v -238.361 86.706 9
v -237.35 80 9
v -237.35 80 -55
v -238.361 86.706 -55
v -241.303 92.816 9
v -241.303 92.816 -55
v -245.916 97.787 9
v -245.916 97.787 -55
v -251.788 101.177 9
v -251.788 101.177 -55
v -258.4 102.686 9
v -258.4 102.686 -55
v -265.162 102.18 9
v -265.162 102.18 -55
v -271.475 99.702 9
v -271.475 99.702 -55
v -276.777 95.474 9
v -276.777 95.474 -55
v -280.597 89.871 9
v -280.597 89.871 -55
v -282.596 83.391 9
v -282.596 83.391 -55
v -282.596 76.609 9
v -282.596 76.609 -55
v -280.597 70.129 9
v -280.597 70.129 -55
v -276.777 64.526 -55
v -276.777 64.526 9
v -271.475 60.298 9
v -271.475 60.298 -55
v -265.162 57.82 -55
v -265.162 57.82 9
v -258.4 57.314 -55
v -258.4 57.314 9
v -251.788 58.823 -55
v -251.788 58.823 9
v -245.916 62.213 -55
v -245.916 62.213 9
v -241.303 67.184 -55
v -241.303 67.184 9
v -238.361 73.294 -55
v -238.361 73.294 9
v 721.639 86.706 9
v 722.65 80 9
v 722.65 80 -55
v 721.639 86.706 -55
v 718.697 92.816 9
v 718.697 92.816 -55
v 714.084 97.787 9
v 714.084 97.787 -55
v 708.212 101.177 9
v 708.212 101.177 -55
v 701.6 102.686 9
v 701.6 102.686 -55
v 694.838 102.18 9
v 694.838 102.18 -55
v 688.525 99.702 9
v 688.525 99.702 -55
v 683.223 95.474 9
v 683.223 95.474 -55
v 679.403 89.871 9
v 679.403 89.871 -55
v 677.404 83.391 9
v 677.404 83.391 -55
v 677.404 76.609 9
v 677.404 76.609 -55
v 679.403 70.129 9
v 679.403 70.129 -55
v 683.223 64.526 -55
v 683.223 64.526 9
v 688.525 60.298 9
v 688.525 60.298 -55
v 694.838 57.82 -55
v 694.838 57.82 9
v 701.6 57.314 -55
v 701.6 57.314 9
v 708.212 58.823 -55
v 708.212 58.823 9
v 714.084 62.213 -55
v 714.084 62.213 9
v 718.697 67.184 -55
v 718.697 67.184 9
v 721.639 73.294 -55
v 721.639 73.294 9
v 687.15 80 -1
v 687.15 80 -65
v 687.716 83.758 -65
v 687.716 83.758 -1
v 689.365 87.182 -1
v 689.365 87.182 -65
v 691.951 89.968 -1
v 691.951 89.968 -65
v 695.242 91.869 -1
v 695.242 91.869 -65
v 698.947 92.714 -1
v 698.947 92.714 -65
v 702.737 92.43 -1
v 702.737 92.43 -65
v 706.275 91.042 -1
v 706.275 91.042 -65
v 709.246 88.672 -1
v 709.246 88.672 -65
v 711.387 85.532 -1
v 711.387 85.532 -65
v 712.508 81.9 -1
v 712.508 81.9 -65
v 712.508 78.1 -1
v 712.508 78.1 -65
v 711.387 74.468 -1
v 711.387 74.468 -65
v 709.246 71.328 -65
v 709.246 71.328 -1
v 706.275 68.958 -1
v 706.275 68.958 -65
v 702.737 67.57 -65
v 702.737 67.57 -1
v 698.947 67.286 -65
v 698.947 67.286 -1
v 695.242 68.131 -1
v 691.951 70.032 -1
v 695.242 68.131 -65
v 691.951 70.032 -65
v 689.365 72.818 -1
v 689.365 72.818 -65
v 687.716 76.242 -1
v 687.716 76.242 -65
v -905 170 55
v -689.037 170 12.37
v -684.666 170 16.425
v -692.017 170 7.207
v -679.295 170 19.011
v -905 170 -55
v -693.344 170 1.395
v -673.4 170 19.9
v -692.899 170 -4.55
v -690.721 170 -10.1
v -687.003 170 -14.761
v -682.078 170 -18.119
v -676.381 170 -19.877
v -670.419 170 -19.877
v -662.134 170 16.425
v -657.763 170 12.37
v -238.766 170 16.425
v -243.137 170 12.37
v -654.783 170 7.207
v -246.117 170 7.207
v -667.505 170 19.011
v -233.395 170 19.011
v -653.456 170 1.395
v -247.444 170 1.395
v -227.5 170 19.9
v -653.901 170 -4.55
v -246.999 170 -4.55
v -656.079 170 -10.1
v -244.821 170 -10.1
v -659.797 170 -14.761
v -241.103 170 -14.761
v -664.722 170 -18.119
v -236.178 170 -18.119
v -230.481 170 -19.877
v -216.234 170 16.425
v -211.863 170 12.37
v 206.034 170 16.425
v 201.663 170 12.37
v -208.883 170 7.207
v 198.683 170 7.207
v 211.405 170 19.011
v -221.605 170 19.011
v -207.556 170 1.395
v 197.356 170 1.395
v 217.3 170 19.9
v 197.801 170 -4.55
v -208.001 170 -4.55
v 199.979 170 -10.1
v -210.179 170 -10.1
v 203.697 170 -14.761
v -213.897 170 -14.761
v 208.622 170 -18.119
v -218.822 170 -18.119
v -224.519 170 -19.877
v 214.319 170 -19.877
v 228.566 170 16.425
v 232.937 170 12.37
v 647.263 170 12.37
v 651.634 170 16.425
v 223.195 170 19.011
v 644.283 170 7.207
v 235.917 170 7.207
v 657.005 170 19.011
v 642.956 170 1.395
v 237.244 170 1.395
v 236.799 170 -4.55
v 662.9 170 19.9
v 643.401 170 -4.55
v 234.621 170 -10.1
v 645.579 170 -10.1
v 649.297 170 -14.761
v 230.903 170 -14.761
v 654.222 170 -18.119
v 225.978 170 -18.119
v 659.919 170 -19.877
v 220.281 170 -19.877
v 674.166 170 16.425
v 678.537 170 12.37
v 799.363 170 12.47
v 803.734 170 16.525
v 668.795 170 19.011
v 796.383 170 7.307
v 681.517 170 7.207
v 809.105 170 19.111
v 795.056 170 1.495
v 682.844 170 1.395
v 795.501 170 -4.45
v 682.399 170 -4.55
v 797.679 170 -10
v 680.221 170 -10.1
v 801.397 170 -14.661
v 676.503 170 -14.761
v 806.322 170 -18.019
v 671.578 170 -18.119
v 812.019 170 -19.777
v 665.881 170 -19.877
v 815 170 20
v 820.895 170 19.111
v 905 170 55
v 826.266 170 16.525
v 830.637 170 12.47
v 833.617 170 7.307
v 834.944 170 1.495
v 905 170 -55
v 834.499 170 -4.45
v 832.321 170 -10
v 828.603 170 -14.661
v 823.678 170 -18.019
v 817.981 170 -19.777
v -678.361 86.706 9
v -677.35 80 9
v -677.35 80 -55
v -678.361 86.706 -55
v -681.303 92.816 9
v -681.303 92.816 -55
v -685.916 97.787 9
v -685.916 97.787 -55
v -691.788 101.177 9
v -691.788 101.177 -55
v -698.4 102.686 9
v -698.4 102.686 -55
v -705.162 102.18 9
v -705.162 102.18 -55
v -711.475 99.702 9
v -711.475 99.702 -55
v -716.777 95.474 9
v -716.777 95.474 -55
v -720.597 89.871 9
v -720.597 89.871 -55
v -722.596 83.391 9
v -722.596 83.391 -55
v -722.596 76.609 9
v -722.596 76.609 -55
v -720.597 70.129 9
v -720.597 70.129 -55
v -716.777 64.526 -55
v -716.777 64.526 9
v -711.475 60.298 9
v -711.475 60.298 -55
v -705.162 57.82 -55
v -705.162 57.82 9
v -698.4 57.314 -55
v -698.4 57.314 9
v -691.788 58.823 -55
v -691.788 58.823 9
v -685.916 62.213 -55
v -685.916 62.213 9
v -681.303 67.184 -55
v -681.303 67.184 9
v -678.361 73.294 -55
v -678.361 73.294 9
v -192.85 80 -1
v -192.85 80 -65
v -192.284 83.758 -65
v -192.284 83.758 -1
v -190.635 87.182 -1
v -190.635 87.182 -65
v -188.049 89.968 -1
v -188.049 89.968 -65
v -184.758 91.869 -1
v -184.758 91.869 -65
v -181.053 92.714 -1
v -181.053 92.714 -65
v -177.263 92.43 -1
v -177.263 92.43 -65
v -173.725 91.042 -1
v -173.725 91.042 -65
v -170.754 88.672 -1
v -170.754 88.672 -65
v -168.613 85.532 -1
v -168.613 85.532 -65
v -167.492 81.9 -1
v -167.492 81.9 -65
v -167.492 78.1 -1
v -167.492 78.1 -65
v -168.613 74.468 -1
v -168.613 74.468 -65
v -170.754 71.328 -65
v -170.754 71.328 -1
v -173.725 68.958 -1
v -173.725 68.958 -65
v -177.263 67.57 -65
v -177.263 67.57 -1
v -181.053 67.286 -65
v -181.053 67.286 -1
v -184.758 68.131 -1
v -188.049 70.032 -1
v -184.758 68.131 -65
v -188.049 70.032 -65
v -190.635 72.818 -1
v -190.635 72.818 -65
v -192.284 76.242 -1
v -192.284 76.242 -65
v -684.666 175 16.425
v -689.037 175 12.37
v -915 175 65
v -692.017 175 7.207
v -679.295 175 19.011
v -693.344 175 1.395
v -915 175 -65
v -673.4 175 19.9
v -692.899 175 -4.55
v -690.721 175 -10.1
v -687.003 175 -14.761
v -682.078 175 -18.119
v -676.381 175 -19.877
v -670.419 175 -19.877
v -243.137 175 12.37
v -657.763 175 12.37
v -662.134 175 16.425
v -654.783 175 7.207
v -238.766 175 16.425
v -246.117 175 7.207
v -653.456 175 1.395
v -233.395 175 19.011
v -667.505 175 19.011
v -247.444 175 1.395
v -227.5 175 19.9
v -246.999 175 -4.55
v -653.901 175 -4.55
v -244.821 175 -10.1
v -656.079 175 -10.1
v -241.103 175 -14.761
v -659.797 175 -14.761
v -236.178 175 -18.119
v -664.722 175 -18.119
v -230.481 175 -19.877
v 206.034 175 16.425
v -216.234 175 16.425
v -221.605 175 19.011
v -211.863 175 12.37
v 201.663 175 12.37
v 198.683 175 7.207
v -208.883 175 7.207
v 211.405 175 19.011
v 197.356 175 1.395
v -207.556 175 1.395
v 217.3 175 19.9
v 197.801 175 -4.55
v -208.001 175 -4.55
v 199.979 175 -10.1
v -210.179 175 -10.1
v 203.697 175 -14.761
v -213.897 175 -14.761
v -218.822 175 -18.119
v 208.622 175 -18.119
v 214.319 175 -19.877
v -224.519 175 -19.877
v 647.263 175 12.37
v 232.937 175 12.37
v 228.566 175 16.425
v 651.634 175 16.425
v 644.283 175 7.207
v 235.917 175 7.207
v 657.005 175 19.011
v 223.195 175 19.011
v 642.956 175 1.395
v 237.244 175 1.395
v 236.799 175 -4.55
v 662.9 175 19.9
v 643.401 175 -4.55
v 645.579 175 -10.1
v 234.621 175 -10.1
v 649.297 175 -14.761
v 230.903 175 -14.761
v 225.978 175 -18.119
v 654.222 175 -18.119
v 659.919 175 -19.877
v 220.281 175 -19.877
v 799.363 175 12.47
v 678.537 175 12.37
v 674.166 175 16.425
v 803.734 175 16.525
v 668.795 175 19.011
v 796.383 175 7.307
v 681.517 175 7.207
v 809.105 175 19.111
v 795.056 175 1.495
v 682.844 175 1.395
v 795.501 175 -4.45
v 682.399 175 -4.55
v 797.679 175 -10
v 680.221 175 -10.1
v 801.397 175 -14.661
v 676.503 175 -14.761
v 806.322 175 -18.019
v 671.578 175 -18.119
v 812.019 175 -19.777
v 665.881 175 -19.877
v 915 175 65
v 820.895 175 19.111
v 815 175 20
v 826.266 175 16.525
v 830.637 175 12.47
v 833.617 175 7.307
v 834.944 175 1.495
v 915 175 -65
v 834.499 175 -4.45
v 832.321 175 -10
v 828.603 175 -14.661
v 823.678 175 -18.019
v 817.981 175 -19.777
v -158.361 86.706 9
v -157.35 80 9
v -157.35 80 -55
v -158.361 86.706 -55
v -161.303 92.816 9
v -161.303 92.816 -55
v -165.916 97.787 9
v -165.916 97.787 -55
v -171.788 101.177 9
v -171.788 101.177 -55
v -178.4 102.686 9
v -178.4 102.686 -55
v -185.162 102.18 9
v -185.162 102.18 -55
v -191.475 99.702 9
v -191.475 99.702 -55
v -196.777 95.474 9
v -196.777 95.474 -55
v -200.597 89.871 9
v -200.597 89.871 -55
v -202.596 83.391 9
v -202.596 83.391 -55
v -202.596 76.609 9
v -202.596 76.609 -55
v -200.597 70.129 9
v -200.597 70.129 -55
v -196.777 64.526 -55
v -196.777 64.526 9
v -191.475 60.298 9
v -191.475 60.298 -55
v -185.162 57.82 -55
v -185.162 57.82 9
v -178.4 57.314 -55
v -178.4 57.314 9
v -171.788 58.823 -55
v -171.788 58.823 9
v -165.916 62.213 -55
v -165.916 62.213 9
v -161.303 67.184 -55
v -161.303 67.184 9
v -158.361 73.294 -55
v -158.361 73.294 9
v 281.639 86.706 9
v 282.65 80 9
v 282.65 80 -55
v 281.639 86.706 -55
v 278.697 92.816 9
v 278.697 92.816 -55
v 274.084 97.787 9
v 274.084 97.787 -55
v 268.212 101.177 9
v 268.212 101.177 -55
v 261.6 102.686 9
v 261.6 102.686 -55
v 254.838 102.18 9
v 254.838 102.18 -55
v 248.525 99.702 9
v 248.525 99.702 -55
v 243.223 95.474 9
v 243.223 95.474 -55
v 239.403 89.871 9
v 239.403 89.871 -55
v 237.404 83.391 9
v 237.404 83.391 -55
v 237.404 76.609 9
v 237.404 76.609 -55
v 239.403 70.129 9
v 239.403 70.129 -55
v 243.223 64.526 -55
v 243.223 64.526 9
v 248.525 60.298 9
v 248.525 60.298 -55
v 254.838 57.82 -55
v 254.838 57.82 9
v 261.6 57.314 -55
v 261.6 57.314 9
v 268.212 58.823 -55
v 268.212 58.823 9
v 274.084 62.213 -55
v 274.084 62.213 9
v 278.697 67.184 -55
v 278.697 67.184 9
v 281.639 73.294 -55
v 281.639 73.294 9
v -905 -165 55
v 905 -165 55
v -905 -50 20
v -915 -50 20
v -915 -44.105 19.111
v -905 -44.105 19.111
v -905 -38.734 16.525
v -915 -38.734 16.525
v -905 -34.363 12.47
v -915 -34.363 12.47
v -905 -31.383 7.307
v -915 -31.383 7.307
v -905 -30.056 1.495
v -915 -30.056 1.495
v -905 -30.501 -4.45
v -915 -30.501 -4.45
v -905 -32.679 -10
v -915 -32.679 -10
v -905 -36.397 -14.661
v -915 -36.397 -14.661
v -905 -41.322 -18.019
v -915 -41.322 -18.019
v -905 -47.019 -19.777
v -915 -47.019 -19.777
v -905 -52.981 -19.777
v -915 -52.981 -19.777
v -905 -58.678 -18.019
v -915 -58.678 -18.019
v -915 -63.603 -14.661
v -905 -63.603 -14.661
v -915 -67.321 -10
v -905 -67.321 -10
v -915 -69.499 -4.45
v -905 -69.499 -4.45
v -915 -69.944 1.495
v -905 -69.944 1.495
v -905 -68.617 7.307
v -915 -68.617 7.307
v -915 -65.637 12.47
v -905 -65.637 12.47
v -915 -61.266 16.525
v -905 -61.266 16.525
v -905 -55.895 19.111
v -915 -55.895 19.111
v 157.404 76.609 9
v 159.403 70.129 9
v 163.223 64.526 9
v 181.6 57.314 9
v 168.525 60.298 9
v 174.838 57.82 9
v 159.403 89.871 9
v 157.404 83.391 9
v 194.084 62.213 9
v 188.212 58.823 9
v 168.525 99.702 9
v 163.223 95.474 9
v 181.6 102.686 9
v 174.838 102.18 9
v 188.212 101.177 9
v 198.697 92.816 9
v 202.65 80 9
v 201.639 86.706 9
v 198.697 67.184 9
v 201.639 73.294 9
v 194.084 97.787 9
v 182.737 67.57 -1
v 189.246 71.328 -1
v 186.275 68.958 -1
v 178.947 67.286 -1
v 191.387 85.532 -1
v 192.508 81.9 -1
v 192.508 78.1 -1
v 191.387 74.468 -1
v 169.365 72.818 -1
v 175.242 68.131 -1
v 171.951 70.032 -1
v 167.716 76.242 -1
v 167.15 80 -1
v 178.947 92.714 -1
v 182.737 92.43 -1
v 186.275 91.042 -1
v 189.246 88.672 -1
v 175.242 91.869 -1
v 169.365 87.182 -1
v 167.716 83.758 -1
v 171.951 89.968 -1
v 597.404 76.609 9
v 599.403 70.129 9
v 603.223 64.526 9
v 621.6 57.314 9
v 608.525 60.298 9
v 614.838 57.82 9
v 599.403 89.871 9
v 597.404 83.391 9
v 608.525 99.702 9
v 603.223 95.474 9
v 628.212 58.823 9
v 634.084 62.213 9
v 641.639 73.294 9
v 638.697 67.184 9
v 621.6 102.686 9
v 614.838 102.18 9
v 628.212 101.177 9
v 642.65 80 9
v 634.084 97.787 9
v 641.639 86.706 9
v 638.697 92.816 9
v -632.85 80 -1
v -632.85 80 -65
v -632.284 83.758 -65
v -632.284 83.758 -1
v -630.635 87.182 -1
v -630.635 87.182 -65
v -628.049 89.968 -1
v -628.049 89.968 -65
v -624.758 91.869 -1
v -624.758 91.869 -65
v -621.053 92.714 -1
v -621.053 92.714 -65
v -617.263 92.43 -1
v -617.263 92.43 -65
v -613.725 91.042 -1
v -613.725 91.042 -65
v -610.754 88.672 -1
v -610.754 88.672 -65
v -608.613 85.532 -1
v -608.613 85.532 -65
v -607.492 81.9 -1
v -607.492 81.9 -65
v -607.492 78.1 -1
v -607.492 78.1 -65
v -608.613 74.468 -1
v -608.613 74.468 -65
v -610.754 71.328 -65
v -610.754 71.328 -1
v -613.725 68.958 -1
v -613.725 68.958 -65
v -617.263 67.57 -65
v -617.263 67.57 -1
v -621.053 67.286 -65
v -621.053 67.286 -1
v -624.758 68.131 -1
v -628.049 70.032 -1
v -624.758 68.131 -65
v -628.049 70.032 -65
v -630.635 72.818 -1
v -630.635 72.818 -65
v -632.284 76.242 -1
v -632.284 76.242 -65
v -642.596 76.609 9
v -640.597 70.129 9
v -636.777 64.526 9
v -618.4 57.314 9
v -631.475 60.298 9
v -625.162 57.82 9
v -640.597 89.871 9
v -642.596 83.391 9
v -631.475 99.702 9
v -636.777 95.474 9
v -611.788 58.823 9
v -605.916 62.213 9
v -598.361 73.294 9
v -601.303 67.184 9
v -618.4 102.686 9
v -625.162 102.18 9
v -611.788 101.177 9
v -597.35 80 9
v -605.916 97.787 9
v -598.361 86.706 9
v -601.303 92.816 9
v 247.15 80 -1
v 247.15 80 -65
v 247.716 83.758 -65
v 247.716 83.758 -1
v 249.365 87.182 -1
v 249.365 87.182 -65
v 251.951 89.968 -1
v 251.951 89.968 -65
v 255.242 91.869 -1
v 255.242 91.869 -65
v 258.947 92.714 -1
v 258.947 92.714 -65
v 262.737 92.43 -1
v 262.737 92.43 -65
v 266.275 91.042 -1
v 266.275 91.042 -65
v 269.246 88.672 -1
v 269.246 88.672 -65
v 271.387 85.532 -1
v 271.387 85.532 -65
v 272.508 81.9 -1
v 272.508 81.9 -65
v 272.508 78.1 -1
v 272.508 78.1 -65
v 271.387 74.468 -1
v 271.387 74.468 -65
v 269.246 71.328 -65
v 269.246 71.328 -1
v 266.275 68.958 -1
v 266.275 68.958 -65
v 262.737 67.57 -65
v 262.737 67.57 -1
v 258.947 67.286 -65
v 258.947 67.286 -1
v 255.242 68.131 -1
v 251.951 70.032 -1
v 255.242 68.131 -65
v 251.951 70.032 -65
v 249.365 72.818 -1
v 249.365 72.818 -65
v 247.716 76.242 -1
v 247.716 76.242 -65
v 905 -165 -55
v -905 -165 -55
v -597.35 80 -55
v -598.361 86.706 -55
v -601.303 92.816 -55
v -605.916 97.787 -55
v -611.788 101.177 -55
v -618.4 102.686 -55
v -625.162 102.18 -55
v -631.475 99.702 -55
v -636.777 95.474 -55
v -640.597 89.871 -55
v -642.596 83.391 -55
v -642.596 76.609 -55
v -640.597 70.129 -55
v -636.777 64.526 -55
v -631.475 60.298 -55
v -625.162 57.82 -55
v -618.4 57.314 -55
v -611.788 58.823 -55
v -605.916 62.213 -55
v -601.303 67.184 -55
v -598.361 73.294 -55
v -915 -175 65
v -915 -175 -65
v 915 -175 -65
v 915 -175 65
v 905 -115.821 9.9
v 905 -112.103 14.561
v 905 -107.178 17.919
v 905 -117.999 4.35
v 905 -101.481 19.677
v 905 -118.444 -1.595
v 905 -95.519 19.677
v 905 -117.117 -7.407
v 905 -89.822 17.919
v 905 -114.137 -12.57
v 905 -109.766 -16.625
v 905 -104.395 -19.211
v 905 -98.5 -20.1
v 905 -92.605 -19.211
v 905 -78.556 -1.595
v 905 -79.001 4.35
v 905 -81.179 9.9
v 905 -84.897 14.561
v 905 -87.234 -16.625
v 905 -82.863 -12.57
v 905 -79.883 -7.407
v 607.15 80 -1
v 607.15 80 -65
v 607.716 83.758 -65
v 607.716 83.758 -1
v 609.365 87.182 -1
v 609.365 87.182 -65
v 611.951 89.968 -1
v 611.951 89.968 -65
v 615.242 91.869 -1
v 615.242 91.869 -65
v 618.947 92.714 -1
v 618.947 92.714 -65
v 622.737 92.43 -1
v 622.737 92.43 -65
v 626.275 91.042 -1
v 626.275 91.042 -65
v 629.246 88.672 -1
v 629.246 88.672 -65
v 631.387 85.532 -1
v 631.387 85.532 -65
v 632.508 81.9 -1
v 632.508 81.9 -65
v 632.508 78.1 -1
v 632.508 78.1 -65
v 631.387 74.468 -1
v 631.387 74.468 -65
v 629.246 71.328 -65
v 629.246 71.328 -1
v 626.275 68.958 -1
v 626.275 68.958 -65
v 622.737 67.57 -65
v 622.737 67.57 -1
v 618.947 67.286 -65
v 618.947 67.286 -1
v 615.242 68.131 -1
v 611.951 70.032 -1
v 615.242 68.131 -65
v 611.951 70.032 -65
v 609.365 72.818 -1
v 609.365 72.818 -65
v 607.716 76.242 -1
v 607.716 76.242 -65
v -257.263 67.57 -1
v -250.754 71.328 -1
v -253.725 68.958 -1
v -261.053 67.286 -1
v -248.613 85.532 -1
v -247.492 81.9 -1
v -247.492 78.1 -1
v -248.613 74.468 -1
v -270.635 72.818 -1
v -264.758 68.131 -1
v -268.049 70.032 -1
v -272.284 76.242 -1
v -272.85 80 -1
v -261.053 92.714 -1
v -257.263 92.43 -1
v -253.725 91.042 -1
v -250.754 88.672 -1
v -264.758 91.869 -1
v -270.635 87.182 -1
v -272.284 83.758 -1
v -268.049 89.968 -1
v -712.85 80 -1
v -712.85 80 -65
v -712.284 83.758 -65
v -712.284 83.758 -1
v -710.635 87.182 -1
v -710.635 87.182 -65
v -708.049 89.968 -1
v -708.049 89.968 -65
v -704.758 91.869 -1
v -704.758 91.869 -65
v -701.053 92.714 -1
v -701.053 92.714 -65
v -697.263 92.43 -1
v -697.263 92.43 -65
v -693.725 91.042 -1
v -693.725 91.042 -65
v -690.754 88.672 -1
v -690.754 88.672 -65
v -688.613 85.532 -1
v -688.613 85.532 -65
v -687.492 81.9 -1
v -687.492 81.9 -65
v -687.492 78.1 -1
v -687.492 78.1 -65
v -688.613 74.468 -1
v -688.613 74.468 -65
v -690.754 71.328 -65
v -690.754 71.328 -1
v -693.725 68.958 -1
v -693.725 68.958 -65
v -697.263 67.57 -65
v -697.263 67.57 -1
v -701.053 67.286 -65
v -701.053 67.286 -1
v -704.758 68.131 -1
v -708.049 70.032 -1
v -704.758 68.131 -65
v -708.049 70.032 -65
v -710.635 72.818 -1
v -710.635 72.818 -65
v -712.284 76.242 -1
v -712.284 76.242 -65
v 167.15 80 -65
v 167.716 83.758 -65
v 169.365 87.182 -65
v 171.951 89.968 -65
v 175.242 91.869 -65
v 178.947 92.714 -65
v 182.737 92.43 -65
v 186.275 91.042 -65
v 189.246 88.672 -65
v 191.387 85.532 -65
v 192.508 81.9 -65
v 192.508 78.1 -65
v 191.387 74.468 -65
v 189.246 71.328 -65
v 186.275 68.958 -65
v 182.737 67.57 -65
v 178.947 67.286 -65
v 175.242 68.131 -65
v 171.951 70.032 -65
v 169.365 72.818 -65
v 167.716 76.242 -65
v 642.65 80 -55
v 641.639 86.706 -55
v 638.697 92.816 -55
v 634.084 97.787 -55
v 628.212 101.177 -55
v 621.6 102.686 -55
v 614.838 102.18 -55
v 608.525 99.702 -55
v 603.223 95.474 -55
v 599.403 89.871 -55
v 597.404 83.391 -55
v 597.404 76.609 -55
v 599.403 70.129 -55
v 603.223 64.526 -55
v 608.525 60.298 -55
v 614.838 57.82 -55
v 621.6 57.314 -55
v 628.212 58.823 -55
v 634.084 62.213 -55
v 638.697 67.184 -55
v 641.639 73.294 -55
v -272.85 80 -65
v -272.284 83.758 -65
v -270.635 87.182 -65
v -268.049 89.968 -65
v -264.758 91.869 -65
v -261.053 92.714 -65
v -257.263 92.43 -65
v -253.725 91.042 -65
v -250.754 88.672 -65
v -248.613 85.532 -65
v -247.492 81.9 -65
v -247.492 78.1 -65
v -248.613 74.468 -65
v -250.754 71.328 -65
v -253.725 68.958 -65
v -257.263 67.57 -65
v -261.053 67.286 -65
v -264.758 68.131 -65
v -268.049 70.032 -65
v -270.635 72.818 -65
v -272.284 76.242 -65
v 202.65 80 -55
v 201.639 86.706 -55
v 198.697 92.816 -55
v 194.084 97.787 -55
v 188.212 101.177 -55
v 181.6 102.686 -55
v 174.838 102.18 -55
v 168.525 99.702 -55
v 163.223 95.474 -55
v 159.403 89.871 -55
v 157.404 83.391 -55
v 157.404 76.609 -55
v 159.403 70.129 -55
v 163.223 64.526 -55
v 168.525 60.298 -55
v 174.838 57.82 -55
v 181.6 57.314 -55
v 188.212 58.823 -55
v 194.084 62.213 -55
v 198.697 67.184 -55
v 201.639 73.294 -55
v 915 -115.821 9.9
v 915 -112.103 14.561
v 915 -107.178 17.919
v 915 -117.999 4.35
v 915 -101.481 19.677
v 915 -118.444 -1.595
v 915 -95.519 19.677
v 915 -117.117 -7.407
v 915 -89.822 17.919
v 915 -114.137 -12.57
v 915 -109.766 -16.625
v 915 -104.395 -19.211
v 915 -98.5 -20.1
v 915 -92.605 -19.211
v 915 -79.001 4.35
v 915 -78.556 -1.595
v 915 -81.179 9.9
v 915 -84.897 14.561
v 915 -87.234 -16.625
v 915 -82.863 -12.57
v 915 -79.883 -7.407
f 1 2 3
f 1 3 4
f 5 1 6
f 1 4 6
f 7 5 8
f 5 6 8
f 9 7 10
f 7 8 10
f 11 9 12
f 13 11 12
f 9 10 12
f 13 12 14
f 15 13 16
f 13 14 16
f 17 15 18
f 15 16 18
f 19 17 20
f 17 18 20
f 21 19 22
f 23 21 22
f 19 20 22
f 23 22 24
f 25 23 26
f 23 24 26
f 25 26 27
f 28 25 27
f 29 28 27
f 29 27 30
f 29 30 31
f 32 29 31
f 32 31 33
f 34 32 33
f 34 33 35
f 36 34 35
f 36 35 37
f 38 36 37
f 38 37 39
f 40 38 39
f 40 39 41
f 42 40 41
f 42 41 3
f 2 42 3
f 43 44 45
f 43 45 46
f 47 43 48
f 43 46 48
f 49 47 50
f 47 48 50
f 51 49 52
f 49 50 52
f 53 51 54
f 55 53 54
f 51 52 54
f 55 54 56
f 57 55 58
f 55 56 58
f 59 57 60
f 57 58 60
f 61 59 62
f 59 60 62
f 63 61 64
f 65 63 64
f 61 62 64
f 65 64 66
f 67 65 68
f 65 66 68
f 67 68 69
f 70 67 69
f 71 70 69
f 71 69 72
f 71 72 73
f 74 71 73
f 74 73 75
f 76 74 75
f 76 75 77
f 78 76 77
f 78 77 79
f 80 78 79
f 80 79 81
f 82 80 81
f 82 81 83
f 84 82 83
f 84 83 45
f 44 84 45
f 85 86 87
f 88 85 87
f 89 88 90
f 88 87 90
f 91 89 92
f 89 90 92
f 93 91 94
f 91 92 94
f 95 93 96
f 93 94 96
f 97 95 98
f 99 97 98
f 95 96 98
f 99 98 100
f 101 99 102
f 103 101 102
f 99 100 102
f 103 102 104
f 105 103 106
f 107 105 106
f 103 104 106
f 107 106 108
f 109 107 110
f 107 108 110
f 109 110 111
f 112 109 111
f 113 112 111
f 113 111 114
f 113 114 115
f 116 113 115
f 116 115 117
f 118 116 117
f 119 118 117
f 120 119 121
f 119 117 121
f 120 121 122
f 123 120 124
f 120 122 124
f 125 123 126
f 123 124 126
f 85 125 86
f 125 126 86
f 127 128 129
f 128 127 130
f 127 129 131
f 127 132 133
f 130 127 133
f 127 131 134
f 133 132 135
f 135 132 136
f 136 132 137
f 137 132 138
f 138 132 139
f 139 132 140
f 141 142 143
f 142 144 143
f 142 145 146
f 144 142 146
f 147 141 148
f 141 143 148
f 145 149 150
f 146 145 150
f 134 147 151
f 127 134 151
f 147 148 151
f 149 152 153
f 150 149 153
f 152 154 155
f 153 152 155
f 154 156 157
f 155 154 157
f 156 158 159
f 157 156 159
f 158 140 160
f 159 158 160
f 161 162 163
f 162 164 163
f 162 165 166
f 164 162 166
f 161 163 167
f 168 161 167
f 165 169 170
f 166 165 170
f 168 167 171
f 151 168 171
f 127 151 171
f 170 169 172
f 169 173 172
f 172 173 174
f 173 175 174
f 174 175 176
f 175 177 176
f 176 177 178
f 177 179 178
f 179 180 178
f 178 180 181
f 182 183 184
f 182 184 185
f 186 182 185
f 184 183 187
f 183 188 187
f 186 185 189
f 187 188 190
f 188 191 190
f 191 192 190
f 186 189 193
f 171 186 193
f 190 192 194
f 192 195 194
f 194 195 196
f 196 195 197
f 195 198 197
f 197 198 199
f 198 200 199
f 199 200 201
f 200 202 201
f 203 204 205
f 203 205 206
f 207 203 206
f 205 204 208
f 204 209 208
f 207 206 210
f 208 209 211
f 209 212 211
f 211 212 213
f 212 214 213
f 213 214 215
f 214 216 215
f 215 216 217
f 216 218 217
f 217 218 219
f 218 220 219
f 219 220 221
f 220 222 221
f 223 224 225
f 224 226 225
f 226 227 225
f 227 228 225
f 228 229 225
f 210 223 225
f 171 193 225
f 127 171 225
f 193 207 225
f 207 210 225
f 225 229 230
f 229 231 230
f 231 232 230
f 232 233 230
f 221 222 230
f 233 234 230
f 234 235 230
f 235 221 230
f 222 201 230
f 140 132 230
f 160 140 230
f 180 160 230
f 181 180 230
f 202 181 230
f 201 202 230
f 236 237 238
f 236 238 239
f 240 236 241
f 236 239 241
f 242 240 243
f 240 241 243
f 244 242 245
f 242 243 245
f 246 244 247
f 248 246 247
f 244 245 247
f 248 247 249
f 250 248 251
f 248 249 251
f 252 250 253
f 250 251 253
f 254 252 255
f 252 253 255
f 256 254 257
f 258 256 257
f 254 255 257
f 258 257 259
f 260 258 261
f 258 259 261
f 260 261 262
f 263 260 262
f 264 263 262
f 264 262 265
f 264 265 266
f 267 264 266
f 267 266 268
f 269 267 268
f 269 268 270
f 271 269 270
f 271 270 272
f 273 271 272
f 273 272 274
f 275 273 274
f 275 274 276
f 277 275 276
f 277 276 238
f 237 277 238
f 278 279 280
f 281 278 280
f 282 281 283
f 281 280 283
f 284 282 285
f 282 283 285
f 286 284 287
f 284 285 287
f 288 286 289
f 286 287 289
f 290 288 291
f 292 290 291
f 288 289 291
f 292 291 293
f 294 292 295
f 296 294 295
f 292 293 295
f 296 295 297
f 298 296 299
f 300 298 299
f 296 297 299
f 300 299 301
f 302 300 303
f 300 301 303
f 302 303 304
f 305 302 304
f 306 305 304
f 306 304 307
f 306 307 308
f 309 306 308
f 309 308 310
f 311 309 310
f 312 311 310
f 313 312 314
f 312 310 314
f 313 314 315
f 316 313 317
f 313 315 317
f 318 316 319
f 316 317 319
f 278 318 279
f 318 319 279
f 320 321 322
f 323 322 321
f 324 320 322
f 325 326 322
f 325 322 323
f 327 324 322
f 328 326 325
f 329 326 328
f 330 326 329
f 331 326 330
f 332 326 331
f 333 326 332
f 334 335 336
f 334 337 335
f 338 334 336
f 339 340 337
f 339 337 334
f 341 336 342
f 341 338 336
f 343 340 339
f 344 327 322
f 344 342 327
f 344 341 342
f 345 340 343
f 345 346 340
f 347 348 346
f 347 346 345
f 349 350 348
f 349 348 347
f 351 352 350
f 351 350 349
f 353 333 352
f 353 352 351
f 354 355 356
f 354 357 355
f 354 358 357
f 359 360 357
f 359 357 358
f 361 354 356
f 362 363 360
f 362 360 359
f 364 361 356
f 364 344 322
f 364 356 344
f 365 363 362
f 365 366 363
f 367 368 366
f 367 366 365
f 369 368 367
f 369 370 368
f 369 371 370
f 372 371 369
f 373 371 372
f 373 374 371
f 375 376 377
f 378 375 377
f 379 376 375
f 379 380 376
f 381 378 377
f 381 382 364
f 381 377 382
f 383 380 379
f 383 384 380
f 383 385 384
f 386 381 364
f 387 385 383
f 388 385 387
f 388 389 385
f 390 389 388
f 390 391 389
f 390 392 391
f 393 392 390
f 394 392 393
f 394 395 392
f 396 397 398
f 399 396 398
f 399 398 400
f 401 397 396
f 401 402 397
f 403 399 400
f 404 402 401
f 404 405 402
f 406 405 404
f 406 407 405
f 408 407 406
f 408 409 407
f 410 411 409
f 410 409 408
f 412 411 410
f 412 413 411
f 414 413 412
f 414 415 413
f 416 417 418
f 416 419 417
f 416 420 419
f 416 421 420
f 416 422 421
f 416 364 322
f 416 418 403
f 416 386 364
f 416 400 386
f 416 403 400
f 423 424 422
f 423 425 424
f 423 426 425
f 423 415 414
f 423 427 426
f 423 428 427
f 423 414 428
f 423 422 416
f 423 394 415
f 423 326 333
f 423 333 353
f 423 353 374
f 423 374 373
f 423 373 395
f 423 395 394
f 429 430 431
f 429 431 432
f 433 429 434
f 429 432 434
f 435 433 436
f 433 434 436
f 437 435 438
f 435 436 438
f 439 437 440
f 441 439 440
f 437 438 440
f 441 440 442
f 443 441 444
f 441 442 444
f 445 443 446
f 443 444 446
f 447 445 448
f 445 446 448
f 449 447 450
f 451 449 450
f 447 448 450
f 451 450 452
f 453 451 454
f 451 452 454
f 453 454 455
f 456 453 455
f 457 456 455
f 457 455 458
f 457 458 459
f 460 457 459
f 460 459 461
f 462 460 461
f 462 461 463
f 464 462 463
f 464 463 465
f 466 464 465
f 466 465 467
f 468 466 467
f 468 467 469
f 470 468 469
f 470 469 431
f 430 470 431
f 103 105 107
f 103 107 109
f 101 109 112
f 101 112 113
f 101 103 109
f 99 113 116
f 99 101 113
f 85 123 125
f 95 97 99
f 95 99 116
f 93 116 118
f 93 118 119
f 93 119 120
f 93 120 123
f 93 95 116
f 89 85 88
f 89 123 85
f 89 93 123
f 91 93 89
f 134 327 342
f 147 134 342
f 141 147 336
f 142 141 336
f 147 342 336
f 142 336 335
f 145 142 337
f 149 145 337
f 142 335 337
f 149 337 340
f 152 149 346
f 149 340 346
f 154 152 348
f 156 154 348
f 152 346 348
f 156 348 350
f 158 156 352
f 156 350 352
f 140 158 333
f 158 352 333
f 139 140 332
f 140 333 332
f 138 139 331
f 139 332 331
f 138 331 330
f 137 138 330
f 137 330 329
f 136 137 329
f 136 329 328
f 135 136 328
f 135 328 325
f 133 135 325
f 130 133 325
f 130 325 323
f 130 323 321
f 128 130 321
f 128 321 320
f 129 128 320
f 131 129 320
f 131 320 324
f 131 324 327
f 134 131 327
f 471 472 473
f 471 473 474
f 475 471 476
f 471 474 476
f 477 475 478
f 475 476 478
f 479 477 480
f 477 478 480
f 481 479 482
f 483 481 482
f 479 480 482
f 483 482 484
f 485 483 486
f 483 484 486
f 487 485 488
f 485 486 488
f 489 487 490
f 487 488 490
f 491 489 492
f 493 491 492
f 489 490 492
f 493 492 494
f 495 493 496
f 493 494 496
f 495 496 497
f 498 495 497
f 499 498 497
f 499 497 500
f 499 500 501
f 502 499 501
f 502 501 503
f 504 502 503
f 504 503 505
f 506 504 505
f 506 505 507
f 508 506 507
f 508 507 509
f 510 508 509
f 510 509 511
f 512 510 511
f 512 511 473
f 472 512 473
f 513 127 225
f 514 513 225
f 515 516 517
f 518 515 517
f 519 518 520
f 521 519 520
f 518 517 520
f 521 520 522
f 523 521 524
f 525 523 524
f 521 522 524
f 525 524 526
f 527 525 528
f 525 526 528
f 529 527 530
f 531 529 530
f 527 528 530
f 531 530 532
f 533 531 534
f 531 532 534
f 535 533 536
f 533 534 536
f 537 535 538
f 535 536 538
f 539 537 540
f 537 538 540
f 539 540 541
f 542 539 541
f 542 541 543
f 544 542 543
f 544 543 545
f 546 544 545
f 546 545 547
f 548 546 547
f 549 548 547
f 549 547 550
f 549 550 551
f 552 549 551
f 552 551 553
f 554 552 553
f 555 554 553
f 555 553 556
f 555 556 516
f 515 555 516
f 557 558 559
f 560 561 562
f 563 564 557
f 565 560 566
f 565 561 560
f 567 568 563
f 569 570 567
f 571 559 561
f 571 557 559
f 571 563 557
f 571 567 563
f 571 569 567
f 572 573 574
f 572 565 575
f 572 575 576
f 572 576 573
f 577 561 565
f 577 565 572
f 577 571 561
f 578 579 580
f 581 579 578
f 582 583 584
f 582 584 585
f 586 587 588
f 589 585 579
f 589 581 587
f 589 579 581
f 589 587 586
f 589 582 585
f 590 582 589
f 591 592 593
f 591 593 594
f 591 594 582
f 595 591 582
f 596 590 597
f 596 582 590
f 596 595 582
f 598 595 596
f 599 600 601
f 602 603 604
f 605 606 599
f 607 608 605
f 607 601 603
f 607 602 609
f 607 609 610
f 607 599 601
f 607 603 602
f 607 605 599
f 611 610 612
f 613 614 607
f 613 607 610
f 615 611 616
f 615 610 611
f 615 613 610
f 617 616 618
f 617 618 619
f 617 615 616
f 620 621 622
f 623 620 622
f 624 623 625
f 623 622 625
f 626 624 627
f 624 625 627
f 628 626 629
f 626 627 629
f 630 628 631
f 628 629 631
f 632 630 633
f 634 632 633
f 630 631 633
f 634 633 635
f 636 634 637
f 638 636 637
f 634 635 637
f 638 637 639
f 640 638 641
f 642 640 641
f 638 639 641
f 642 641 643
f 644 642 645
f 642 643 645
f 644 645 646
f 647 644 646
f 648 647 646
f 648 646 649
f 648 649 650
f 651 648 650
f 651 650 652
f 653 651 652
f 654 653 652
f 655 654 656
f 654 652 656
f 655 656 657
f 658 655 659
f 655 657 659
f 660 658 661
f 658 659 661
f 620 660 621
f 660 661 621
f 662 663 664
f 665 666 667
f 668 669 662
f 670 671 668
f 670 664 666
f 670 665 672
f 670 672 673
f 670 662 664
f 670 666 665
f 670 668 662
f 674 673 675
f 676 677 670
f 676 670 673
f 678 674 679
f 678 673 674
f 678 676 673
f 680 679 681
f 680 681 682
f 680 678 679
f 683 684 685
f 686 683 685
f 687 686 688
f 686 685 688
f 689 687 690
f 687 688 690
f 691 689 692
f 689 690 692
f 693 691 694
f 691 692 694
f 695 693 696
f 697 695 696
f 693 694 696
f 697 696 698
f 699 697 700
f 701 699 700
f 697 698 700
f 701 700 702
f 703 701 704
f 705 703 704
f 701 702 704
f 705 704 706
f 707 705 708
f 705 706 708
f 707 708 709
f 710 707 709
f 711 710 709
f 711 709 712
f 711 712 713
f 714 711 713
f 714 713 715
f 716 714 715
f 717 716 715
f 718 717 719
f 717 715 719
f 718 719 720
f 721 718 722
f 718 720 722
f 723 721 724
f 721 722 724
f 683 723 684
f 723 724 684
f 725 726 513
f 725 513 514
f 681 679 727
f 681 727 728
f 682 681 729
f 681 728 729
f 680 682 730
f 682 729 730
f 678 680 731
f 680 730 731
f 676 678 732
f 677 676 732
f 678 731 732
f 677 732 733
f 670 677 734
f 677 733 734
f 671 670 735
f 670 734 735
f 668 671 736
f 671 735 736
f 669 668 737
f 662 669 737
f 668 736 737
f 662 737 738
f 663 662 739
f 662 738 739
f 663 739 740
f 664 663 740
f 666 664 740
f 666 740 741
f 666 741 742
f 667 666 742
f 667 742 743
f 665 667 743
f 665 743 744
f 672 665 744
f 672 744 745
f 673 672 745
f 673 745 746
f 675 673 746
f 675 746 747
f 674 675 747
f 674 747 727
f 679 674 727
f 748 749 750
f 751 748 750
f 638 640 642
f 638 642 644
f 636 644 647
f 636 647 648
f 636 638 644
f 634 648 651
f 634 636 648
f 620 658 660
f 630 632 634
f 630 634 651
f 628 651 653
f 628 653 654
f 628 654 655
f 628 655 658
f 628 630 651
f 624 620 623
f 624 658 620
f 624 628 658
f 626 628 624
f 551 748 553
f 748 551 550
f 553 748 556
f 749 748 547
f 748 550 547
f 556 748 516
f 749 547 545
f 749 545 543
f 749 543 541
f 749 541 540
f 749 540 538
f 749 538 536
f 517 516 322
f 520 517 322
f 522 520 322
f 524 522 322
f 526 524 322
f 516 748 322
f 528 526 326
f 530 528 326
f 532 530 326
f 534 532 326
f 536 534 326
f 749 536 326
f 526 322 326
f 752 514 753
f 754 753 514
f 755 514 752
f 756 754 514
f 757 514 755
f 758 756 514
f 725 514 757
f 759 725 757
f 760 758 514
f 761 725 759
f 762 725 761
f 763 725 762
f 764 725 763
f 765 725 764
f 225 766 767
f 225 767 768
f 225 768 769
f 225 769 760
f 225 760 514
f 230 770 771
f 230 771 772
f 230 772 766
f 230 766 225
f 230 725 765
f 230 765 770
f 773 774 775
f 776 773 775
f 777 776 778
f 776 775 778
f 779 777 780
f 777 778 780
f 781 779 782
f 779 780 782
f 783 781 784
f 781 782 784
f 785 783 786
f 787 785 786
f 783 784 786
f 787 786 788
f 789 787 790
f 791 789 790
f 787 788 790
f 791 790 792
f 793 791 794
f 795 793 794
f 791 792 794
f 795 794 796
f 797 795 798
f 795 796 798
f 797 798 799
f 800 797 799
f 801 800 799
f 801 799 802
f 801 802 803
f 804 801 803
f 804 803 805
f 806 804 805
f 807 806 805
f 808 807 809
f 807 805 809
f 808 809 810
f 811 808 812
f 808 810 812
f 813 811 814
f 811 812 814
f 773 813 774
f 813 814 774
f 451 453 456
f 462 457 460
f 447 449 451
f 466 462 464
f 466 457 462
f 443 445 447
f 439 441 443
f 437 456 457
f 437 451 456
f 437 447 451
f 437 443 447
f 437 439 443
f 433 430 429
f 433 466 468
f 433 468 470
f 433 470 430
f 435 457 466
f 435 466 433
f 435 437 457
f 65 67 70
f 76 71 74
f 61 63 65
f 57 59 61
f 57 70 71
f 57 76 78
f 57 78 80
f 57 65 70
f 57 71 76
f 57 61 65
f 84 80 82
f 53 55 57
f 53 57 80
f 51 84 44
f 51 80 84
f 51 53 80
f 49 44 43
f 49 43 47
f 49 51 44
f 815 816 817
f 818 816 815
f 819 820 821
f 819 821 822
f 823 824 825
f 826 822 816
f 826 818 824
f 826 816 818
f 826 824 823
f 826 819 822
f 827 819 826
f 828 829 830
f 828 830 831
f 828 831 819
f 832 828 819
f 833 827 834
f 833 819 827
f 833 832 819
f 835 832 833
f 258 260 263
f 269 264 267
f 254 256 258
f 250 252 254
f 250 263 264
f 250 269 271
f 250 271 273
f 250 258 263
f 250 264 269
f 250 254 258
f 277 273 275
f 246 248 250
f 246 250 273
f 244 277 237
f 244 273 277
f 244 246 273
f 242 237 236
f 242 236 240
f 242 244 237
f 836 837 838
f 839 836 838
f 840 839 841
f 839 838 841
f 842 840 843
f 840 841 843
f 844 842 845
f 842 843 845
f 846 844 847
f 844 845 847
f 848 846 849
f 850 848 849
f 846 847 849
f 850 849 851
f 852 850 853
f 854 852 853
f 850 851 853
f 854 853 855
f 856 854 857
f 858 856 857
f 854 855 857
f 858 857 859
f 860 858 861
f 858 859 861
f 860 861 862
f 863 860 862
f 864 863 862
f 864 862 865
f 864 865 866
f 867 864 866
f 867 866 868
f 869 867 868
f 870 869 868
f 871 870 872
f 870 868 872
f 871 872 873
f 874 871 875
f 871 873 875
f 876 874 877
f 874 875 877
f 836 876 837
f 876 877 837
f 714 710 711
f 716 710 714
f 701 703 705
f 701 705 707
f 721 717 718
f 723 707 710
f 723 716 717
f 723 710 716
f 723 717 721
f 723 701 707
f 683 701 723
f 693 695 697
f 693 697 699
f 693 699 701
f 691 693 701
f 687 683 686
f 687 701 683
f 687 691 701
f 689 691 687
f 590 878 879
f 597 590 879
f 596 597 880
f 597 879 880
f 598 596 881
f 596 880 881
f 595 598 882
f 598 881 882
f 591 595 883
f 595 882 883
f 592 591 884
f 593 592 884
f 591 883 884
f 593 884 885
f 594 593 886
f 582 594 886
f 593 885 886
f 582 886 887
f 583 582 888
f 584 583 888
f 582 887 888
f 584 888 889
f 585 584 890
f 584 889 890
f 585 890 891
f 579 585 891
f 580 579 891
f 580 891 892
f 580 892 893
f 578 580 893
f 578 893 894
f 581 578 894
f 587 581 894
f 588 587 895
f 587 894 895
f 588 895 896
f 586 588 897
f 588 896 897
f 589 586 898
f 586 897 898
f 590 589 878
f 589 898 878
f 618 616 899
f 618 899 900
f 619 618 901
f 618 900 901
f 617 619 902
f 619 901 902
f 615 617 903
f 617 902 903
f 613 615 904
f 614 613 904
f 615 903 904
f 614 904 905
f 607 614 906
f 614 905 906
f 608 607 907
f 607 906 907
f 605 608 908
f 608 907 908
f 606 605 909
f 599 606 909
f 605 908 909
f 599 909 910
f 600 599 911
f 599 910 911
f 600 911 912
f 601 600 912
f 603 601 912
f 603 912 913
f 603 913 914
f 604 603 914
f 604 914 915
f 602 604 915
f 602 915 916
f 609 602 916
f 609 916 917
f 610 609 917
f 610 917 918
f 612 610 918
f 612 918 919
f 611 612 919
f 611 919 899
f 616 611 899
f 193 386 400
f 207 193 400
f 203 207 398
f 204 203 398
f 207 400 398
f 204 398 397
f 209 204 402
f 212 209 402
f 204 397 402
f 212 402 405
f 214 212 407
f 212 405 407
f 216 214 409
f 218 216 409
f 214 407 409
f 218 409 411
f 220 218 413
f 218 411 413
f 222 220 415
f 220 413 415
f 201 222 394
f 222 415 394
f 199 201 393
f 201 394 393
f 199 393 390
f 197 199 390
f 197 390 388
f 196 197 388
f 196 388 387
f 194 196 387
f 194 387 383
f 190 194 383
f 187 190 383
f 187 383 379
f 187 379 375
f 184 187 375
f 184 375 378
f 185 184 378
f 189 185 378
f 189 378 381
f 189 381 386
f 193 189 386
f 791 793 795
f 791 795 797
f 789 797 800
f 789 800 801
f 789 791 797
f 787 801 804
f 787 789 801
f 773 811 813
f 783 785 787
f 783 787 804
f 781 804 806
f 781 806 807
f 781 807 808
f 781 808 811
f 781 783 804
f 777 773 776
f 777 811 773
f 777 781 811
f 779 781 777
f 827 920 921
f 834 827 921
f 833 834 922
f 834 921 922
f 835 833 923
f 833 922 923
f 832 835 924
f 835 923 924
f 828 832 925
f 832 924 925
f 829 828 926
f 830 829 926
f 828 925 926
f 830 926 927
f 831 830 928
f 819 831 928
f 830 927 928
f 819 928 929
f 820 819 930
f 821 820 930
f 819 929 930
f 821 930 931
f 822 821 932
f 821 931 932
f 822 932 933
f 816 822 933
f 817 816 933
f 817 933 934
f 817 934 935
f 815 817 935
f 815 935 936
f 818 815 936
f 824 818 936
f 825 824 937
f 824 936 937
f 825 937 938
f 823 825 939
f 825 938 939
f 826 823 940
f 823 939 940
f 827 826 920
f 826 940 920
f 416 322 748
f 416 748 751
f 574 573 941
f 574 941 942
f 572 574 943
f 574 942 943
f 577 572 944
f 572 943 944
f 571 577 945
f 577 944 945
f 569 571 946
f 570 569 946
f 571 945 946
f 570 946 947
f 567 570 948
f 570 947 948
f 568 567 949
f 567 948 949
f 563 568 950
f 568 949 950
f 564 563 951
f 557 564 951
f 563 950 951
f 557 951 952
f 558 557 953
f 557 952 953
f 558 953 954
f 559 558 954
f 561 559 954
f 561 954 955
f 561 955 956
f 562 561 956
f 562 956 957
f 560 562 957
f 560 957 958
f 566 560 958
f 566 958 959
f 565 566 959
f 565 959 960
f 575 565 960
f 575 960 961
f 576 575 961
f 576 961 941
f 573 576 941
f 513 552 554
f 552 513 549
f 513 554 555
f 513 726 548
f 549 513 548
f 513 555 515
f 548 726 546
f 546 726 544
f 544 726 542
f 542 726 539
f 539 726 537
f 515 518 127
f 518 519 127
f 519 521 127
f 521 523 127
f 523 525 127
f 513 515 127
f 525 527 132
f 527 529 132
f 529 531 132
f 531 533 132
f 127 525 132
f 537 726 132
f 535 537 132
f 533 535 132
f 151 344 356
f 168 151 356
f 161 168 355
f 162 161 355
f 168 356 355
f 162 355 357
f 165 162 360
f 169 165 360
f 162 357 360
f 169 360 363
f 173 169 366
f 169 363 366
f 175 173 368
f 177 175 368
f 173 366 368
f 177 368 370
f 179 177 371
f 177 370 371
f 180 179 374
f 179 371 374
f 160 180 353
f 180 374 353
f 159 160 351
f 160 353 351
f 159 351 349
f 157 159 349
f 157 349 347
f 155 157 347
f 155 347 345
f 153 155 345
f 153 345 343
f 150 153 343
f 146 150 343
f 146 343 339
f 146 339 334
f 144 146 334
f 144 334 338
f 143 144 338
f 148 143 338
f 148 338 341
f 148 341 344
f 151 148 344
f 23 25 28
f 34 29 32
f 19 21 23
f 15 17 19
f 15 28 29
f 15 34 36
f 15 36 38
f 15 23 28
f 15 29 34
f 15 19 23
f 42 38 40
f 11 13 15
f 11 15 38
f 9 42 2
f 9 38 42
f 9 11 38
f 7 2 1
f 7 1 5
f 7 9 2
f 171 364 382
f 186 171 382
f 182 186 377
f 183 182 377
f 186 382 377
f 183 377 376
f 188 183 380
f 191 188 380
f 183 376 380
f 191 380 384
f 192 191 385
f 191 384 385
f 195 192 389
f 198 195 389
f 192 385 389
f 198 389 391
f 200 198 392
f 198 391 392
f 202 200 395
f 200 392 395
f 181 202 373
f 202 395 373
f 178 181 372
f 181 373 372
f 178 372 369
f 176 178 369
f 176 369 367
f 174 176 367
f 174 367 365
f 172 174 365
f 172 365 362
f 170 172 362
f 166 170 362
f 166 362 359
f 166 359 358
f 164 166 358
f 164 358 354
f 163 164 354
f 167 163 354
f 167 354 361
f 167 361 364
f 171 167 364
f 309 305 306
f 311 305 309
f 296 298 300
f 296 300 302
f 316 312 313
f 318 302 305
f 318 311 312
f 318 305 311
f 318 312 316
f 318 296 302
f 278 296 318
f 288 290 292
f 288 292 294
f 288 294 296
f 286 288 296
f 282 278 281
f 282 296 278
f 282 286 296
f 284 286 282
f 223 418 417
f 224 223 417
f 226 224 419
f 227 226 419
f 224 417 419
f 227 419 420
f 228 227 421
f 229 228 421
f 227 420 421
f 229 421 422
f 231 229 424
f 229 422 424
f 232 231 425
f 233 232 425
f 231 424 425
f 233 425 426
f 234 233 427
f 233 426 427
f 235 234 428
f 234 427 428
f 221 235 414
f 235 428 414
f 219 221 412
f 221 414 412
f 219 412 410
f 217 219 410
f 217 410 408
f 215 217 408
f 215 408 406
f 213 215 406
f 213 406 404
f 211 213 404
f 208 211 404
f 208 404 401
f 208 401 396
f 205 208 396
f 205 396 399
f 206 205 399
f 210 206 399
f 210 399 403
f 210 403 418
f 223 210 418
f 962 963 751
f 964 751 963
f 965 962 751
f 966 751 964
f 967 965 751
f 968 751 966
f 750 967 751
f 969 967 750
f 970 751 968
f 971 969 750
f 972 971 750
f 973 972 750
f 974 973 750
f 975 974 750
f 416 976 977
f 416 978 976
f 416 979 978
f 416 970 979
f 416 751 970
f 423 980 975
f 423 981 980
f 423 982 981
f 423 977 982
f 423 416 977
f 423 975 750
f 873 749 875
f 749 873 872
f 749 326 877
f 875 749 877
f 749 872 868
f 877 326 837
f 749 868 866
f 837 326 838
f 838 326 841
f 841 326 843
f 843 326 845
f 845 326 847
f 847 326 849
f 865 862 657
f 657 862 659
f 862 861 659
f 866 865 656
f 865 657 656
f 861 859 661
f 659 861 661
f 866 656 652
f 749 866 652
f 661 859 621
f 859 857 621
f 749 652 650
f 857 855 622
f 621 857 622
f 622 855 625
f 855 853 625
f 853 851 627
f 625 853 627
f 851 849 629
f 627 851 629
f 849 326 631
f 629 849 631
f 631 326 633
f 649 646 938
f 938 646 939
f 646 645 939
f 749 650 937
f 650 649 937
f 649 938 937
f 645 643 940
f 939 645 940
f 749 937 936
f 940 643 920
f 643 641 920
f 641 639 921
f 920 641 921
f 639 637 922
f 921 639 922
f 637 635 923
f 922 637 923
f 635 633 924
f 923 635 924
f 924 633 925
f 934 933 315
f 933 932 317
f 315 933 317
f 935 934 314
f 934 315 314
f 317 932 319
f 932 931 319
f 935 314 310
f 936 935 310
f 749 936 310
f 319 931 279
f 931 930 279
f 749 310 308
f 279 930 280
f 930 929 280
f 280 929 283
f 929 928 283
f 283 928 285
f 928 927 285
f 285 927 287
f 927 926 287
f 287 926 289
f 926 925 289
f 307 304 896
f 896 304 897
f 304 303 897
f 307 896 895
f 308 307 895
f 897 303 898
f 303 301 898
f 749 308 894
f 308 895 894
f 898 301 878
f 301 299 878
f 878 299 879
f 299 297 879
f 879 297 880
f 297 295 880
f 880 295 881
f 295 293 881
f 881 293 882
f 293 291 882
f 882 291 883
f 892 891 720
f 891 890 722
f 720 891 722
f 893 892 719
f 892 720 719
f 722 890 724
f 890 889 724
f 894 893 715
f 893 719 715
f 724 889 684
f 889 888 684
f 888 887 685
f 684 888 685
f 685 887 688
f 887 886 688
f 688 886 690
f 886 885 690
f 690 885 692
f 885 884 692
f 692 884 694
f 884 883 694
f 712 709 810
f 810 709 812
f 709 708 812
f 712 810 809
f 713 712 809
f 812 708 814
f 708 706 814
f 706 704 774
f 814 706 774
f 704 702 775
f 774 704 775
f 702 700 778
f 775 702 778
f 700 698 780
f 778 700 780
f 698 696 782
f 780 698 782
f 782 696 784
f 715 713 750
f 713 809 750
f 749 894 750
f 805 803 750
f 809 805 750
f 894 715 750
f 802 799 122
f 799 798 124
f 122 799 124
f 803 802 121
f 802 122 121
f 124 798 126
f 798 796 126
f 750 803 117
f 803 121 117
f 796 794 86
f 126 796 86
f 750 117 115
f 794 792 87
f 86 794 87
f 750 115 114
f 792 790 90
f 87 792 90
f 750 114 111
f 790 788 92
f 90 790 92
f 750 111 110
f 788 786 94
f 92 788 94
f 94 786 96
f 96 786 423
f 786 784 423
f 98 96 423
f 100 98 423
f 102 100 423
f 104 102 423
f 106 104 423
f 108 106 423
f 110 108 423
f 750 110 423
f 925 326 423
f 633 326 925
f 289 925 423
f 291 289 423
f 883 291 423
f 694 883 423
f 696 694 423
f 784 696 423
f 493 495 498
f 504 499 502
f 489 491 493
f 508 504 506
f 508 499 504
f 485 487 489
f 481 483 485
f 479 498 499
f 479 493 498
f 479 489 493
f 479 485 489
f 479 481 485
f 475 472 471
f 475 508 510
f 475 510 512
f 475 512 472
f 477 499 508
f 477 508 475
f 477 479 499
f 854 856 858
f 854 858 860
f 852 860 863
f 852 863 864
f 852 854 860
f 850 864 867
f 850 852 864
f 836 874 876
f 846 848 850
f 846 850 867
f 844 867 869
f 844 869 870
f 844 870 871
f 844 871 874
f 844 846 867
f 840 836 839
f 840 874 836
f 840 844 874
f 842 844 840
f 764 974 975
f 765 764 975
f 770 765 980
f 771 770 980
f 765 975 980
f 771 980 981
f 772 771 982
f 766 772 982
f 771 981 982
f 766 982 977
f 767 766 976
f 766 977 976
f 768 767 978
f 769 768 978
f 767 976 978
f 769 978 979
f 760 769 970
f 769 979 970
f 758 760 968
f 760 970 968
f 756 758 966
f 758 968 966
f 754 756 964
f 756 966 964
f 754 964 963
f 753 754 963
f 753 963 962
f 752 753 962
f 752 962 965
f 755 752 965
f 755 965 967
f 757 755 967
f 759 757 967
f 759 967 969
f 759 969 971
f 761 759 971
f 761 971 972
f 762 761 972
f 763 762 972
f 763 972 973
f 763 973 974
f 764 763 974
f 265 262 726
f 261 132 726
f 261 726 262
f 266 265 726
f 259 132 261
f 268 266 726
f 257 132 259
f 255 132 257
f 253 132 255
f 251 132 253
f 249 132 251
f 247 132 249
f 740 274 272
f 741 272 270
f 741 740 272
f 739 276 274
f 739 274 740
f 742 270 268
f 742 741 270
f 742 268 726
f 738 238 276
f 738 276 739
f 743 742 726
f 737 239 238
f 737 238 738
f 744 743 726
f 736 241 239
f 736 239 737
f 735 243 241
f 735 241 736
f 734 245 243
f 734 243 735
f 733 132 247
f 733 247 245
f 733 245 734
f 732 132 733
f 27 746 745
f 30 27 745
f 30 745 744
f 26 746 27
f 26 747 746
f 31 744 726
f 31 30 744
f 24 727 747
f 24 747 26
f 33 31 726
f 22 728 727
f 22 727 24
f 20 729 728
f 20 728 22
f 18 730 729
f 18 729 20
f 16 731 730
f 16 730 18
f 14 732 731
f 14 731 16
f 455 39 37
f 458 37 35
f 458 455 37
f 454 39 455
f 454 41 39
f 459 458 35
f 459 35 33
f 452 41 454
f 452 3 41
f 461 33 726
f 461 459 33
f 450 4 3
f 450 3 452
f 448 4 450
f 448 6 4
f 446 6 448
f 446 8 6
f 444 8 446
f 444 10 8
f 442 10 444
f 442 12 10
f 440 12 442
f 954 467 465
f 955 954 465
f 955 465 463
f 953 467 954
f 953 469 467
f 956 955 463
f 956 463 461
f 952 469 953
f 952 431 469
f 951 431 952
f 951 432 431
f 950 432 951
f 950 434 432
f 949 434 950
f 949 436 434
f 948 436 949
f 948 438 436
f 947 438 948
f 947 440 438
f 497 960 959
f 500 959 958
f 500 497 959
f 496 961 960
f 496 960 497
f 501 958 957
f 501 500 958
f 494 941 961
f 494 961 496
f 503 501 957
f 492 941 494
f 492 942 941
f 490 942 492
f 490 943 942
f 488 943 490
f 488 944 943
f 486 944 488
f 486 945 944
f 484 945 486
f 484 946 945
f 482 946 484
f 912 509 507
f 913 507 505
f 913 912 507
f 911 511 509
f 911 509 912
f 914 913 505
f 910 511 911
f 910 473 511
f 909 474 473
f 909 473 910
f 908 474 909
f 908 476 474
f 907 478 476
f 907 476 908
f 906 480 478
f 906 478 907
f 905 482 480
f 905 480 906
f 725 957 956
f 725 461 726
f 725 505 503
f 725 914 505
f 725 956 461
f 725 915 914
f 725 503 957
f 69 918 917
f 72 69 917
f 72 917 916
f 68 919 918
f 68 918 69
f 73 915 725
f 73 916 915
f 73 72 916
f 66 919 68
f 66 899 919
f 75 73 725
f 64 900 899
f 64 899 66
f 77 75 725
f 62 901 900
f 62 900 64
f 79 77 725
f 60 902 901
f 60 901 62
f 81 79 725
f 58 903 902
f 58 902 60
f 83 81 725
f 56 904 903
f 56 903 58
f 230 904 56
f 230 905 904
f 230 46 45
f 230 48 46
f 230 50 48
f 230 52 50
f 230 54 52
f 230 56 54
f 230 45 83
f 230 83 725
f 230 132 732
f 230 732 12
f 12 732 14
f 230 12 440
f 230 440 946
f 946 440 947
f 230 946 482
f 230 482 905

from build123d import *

# Parameters (mm, degrees)
SKETCH1_W           = 1830
SKETCH1_H           = 130
BOSS_EXTRUDE1_DEPTH = 175
SKETCH4_R           = 12.75
CUT_EXTRUDE1_DEPTH  = 64
SHELL1_START        = -55
SHELL1_OUTLINE_W    = 1810
SHELL1_OUTLINE_H    = 335
SHELL1_OUTLINE_R    = 22.75
SHELL1_DEPTH        = 110
SHELL1_START_2      = 9
SHELL1_2_OUTLINE_R  = 22.75
SHELL1_2_DEPTH      = 46
SKETCH5_R           = 20
CUT_EXTRUDE2_DEPTH  = 64
SKETCH6_R           = 20
CUT_EXTRUDE4_DEPTH  = 39
SKETCH7_R           = 20
CUT_EXTRUDE5_DEPTH  = 50
SKETCH9_R           = 20
CUT_EXTRUDE6_DEPTH  = 50


with BuildPart() as part:
    # Sketch1 → Boss-Extrude1 (new, symmetric)
    with BuildSketch(Plane(origin=(0, 0, 0), x_dir=(1, 0, 0), z_dir=(0, 1, 0))):
        Rectangle(SKETCH1_W, SKETCH1_H)
    extrude(amount=BOSS_EXTRUDE1_DEPTH, both=True)

    # Sketch4 → Cut-Extrude1 (cut)
    with BuildSketch(Plane(origin=(0, 0, -65), x_dir=(-1, 0, 0), z_dir=(0, 0, -1))):
        with Locations((-699.9, 80)):
            Circle(SKETCH4_R)
        with Locations((-619.9, 80)):
            Circle(SKETCH4_R)
        with Locations((-259.9, 80)):
            Circle(SKETCH4_R)
        with Locations((-179.9, 80)):
            Circle(SKETCH4_R)
        with Locations((180.1, 80)):
            Circle(SKETCH4_R)
        with Locations((260.1, 80)):
            Circle(SKETCH4_R)
        with Locations((620.1, 80)):
            Circle(SKETCH4_R)
        with Locations((700.1, 80)):
            Circle(SKETCH4_R)
    extrude(amount=-CUT_EXTRUDE1_DEPTH, mode=Mode.SUBTRACT)

    # Shell1: read off the stored shape, not the designer's step
    # Shell1 outline → Shell1 (cut)
    with BuildSketch(Plane.XY.offset(SHELL1_START)):
        with Locations((0, 2.5)):
            Rectangle(SHELL1_OUTLINE_W, SHELL1_OUTLINE_H)
        with Locations((-700.1, 80)):
            Circle(SHELL1_OUTLINE_R, mode=Mode.SUBTRACT)
        with Locations((-620.1, 80)):
            Circle(SHELL1_OUTLINE_R, mode=Mode.SUBTRACT)
        with Locations((-260.1, 80)):
            Circle(SHELL1_OUTLINE_R, mode=Mode.SUBTRACT)
        with Locations((-180.1, 80)):
            Circle(SHELL1_OUTLINE_R, mode=Mode.SUBTRACT)
        with Locations((179.9, 80)):
            Circle(SHELL1_OUTLINE_R, mode=Mode.SUBTRACT)
        with Locations((259.9, 80)):
            Circle(SHELL1_OUTLINE_R, mode=Mode.SUBTRACT)
        with Locations((619.9, 80)):
            Circle(SHELL1_OUTLINE_R, mode=Mode.SUBTRACT)
        with Locations((699.9, 80)):
            Circle(SHELL1_OUTLINE_R, mode=Mode.SUBTRACT)
    extrude(amount=SHELL1_DEPTH, mode=Mode.SUBTRACT)

    # Shell1 2 outline → Shell1 2 (cut)
    with BuildSketch(Plane.XY.offset(SHELL1_START_2)):
        with Locations((-700.1, 80)):
            Circle(SHELL1_2_OUTLINE_R)
        with Locations((-620.1, 80)):
            Circle(SHELL1_2_OUTLINE_R)
        with Locations((-260.1, 80)):
            Circle(SHELL1_2_OUTLINE_R)
        with Locations((-180.1, 80)):
            Circle(SHELL1_2_OUTLINE_R)
        with Locations((179.9, 80)):
            Circle(SHELL1_2_OUTLINE_R)
        with Locations((259.9, 80)):
            Circle(SHELL1_2_OUTLINE_R)
        with Locations((619.9, 80)):
            Circle(SHELL1_2_OUTLINE_R)
        with Locations((699.9, 80)):
            Circle(SHELL1_2_OUTLINE_R)
    extrude(amount=SHELL1_2_DEPTH, mode=Mode.SUBTRACT)

    # Sketch5 → Cut-Extrude2 (cut)
    with BuildSketch(Plane(origin=(0, 175, 0), x_dir=(1, 0, 0), z_dir=(0, 1, 0))):
        with Locations(Location((815, 0, 0), (0, 0, 270))):
            Circle(SKETCH5_R)
    extrude(amount=-CUT_EXTRUDE2_DEPTH, mode=Mode.SUBTRACT)

    # Sketch6 → Cut-Extrude4 (cut)
    with BuildSketch(Plane.ZY.offset(915)):
        with Locations((0, -50)):
            Circle(SKETCH6_R)
    extrude(amount=-CUT_EXTRUDE4_DEPTH, mode=Mode.SUBTRACT)

    # Sketch7 → Cut-Extrude5 (cut)
    with BuildSketch(Plane(origin=(0, 175, 0), x_dir=(1, 0, 0), z_dir=(0, 1, 0))):
        with Locations(Location((662.9, 0.1, 0), (0, 0, 270))):
            Circle(SKETCH7_R)
        with Locations(Location((217.3, 0.1, 0), (0, 0, 270))):
            Circle(SKETCH7_R)
        with Locations(Location((-227.5, 0.1, 0), (0, 0, 270))):
            Circle(SKETCH7_R)
        with Locations(Location((-673.4, 0.1, 0), (0, 0, 270))):
            Circle(SKETCH7_R)
    extrude(amount=-CUT_EXTRUDE5_DEPTH, mode=Mode.SUBTRACT)

    # Sketch9 → Cut-Extrude6 (cut)
    with BuildSketch(Plane(origin=(915, 0, 0), x_dir=(0, 0, -1), z_dir=(1, 0, 0))):
        with Locations((0.1, -98.5)):
            Circle(SKETCH9_R)
    extrude(amount=-CUT_EXTRUDE6_DEPTH, mode=Mode.SUBTRACT)


solid = part.part
